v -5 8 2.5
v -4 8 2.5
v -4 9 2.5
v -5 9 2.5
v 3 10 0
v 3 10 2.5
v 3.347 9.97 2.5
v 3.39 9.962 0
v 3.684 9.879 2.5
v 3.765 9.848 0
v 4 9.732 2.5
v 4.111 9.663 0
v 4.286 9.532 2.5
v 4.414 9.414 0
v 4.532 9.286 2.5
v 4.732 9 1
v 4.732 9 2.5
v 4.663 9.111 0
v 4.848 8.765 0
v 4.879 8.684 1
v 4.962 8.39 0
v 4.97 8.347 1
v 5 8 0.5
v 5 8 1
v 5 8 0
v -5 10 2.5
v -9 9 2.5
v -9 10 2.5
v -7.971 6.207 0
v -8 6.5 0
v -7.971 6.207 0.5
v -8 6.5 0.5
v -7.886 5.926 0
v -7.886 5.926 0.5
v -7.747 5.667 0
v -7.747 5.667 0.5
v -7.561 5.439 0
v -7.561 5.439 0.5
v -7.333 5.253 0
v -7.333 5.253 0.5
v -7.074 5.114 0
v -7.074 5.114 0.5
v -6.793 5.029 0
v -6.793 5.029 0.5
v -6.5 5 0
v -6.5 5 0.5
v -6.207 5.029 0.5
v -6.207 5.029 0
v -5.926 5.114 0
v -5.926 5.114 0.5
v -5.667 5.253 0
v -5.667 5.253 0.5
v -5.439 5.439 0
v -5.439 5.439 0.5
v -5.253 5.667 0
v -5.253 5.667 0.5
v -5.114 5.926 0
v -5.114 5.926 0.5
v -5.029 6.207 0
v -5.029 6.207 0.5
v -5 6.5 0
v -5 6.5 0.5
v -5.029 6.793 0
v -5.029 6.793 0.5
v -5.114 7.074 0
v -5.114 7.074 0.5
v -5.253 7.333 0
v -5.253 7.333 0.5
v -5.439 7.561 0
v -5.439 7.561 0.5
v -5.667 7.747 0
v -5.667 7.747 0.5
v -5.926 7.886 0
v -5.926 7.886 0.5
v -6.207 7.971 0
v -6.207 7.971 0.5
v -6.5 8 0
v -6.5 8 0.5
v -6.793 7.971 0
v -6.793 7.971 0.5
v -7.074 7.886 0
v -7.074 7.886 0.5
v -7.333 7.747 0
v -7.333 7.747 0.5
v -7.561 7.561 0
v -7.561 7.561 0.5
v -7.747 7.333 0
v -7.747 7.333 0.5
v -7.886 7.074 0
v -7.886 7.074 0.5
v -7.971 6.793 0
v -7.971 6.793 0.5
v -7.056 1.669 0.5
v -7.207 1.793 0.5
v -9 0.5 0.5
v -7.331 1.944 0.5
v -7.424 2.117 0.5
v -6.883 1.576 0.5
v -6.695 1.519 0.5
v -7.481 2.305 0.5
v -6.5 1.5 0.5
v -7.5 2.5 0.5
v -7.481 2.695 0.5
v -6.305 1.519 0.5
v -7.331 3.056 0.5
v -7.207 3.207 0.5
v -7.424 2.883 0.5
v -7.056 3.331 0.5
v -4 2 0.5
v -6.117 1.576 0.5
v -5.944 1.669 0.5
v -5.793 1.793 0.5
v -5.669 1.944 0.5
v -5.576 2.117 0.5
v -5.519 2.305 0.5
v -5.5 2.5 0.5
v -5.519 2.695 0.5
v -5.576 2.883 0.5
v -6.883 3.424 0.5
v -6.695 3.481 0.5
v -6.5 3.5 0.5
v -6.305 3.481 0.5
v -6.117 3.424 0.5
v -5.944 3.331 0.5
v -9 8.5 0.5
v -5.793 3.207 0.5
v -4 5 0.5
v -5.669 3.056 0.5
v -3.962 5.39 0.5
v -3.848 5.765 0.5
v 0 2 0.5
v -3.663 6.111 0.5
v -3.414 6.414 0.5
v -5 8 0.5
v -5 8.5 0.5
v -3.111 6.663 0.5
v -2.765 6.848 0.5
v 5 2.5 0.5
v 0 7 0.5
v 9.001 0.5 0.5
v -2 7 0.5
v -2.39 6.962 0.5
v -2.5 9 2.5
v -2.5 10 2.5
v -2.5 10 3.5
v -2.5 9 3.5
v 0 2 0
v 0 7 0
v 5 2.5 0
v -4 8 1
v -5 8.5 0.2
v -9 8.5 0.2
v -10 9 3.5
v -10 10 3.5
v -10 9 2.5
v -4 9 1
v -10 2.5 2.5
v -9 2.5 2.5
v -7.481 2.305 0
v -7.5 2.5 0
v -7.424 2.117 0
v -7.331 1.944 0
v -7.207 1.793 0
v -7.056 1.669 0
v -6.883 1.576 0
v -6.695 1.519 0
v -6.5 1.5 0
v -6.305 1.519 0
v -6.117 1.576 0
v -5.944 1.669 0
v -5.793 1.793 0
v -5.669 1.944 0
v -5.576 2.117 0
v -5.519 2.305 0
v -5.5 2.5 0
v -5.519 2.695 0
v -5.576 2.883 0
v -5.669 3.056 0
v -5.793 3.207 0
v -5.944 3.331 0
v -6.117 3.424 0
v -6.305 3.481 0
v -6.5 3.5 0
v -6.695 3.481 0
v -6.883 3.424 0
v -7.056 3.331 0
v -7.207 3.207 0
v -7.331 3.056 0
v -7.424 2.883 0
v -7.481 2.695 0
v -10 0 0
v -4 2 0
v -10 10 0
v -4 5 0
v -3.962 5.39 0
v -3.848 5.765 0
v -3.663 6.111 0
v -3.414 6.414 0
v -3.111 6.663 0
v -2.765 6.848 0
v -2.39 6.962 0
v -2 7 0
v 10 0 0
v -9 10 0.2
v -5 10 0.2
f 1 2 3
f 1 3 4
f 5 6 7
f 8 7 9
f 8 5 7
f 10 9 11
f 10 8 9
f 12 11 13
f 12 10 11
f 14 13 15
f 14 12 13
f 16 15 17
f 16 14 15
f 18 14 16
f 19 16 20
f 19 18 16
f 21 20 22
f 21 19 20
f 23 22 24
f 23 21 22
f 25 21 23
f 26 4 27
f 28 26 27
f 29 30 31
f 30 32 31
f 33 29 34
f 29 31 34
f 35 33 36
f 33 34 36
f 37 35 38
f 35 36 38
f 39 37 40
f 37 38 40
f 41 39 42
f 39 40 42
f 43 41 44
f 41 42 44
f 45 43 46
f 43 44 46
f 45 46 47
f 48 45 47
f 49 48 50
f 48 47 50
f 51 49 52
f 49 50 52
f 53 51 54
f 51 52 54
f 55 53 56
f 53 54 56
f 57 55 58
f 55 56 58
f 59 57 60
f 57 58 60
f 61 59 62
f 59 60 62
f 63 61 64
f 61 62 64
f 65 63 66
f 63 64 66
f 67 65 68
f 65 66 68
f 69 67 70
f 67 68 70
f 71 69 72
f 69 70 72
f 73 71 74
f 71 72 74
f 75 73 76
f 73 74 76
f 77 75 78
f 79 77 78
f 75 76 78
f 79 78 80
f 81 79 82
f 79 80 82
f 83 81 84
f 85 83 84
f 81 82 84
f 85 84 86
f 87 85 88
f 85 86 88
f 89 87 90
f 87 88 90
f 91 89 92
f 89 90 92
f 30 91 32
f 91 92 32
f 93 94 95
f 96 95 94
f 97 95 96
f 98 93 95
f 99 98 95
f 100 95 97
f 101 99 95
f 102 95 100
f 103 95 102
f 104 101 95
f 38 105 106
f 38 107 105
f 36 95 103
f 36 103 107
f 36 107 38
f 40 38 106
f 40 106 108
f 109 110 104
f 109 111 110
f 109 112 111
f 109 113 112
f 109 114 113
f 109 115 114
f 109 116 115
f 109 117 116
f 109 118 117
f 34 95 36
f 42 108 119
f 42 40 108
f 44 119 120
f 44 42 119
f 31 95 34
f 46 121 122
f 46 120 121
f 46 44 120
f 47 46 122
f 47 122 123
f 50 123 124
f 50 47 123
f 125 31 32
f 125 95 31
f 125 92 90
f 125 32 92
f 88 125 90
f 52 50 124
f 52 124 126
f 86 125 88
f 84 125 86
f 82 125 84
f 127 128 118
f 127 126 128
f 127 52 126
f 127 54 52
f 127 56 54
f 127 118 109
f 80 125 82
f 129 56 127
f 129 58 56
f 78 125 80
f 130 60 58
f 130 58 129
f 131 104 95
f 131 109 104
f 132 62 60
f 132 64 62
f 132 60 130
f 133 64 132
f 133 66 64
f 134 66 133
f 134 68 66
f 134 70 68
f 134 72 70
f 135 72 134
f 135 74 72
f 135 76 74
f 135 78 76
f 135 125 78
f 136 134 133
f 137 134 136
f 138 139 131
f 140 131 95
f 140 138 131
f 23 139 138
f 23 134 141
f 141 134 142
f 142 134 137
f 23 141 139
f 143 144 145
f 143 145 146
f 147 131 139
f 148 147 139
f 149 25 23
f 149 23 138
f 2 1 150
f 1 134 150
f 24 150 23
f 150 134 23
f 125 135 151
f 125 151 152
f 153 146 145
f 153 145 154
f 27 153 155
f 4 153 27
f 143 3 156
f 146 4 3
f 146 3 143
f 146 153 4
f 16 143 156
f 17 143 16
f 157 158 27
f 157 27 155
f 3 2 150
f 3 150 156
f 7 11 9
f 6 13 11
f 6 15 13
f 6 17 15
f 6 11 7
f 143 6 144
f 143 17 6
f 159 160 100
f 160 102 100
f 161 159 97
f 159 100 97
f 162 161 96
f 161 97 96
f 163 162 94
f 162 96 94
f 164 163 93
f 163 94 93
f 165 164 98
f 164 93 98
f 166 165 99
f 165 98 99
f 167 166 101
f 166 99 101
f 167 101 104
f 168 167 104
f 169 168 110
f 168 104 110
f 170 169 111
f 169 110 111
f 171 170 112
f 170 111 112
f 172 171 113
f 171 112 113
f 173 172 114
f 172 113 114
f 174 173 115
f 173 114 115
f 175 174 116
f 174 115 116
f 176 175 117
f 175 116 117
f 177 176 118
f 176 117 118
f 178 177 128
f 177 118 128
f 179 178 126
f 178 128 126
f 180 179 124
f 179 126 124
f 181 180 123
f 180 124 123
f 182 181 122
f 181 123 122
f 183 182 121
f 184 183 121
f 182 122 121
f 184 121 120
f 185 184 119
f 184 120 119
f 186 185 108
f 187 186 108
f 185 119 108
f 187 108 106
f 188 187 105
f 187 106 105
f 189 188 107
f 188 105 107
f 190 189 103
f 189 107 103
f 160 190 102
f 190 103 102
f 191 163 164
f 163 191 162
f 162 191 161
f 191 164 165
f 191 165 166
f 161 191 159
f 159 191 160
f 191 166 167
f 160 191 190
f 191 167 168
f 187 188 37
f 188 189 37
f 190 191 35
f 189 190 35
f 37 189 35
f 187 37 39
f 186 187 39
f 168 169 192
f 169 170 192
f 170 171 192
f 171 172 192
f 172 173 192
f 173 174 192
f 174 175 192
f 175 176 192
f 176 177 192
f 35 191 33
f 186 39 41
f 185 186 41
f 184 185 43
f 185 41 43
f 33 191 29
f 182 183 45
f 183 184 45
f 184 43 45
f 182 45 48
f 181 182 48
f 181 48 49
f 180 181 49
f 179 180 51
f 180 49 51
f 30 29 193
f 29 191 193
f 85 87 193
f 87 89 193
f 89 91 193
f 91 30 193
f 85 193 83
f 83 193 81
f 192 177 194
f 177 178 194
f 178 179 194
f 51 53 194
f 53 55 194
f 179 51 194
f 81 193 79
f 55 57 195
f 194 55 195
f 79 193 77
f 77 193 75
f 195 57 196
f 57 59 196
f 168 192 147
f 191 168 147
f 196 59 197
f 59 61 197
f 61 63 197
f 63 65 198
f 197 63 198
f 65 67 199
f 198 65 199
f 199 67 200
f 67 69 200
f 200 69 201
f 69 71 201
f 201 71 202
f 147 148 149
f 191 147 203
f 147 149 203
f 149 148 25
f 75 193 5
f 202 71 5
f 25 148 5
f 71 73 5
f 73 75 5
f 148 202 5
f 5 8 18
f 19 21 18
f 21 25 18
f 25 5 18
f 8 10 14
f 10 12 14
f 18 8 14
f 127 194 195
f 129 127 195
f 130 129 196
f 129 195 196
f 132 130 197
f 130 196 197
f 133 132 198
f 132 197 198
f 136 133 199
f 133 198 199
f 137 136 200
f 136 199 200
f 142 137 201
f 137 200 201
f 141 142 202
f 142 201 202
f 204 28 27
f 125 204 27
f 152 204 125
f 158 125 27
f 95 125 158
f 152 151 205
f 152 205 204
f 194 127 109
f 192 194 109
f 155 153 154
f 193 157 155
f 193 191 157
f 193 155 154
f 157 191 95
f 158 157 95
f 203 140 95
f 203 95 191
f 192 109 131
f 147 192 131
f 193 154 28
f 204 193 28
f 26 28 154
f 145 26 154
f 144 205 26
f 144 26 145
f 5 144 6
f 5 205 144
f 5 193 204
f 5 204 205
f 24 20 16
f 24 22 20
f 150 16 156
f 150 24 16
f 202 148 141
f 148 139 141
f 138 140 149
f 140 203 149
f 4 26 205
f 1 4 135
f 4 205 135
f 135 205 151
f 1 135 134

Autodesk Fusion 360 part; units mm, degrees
sketch "Sketch1" plane through (0, 0, 0) normal (0, 0, 1) x (1, 0, 0) in component "test"
  line L0 (-10, 10) -> (5, 10)
  line L1 (5, 10) -> (5, 0)
  line L2 (5, 0) -> (-10, 0)
  line L3 (-10, 0) -> (-10, 10)
  line L4 (5, 0) -> (10, 0)
  line L5 (10, 0) -> (5, 2.5)
  dimension "d1" = 15
  dimension "d2" = 10
extrude "Extrude1" add sketch "Sketch1" along normal blind 0.5 in component "test"
sketch "Sketch2" plane through (0, 0, 0.5) normal (0, 0, 1) x (-1, 0, 0) in component "test"
  line L0 (10, 0) -> (-10, 0)
  line L1 (-5, -2.5) -> (-5, -10)
  line L2 (-5, -10) -> (10, -10)
  line L3 (10, -10) -> (10, 0)
  line L4 (10, -10) -> (9, -10)
  line L5 (9, -10) -> (9, 0)
  line L6 (9, 0) -> (10, 0)
  line L7 (10, 0) -> (10, -10)
  line L8 (-5, -10) -> (5, -10)
  line L9 (5, -10) -> (5, -8)
  line L10 (5, -8) -> (-5, -8)
  line L11 (-5, -8) -> (-5, -10)
  line L12 (-10, 0) -> (-5, -2.5)
extrude "Extrude2" add sketch "Sketch2" along normal blind 2 contours L0 L2 L3 L4 L5 L6 L7 | L1 L2 L8 L9 L10 L11 in component "test"
sketch "Sketch3" plane through (0, 0, 2.5) normal (0, 0, 1) x (-1, 0, 0) in component "test"
  line L0 (-5, -8) -> (-5, -10)
  line L1 (-5, -10) -> (5, -10)
  line L2 (5, -10) -> (5, -8)
  line L3 (5, -8) -> (-5, -8)
  line L4 (-5, -8) -> (4, -8)
  line L5 (4, -8) -> (4, -9)
  line L6 (4, -9) -> (-5, -9)
  line L7 (-5, -9) -> (-5, -8)
extrude "Extrude3" cut sketch "Sketch3" against normal blind 1.5 contours L0 L3 L4 L5 L6 L7 in component "test"
sketch "Sketch4" plane through (0, 0, 0.5) normal (0, 0, 1) x (-1, 0, 0) in component "test"
  line L0 (5, -8) -> (5, -10)
  line L1 (5, -10) -> (9, -10)
  line L2 (9, -10) -> (9, 0)
  line L3 (9, 0) -> (-10, 0)
  line L4 (-5, -2.5) -> (-5, -8)
  line L5 (-5, -8) -> (5, -8)
  line L6 (0, -7) -> (4, -7)
  line L7 (4, -7) -> (4, -2)
  line L8 (4, -2) -> (0, -2)
  line L9 (0, -2) -> (0, -7)
  circle A0 centre (6.5, -6.5) radius 1.5
  circle A1 centre (6.5, -2.5) radius 1
  line L10 (-10, 0) -> (-5, -2.5)
  dimension "d9" = 3
  dimension "d10" = 2
extrude "Extrude4" cut sketch "Sketch4" against normal through all contours L6 L7 L8 L9 | A0 | A1 in component "test"
sketch "Sketch5" plane through (0, 0, 2.5) normal (0, 0, 1) x (-1, 0, 0) in component "test"
  line L0 (10, 0) -> (9, 0)
  line L1 (9, 0) -> (9, -10)
  line L2 (9, -10) -> (10, -10)
  line L3 (10, -10) -> (10, 0)
  line L4 (10, -10) -> (2.5, -10)
  line L5 (2.5, -10) -> (2.5, -9)
  line L6 (2.5, -9) -> (10, -9)
  line L7 (10, -9) -> (10, -10)
extrude "Extrude5" add sketch "Sketch5" along normal blind 1 contours L1 L2 L3 L4 L6 L7 | L1 L4 L5 L6 in component "test"
chamfer "Chamfer1" distance 2.5 angle 45 1 edges at (-9.5, 0, 2.5) in component "test"
fillet "Fillet1" radius 2 1 edges at (5, 10, 1.25) in component "test"
fillet "Fillet2" radius 2 1 edges at (-4, 7, 0.25) in component "test"
sketch "Sketch6" plane through (0, 0, 0.5) normal (0, 0, 1) x (-1, 0, 0) in component "test"
  line L0 (9, -0.5) -> (-9, -0.5)
  line L1 (-9, -0.5) -> (-5, -2.5)
  line L2 (-5, -2.5) -> (-5, -8)
  line L3 (-5, -8) -> (5, -8)
  line L4 (5, -8) -> (5, -10)
  line L5 (5, -10) -> (9, -10)
  line L6 (9, -10) -> (9, -0.5)
  line L7 (0, -2) -> (4, -2)
  line L8 (4, -2) -> (4, -5)
  arc A0 (2, -7) -> (4, -5) centre (2, -5) ccw
  line L9 (2, -7) -> (0, -7)
  line L10 (0, -7) -> (0, -2)
  circle A1 centre (6.5, -6.5) radius 1.5
  circle A2 centre (6.5, -2.5) radius 1
  line L11 (5, -8.5) -> (9, -8.5)
  line L12 (9, -8.5) -> (9, -10)
  line L13 (9, -10) -> (5, -10)
  line L14 (5, -10) -> (5, -8.5)
extrude "Extrude6" cut sketch "Sketch6" against normal blind 0.3 contours L4 L5 L6 L11 L12 L13 L14 in component "test"
component "test" placed x (1, 0, 0) y (0, 1, 0) z (0, 0, 1) at (0, 0, 0)
